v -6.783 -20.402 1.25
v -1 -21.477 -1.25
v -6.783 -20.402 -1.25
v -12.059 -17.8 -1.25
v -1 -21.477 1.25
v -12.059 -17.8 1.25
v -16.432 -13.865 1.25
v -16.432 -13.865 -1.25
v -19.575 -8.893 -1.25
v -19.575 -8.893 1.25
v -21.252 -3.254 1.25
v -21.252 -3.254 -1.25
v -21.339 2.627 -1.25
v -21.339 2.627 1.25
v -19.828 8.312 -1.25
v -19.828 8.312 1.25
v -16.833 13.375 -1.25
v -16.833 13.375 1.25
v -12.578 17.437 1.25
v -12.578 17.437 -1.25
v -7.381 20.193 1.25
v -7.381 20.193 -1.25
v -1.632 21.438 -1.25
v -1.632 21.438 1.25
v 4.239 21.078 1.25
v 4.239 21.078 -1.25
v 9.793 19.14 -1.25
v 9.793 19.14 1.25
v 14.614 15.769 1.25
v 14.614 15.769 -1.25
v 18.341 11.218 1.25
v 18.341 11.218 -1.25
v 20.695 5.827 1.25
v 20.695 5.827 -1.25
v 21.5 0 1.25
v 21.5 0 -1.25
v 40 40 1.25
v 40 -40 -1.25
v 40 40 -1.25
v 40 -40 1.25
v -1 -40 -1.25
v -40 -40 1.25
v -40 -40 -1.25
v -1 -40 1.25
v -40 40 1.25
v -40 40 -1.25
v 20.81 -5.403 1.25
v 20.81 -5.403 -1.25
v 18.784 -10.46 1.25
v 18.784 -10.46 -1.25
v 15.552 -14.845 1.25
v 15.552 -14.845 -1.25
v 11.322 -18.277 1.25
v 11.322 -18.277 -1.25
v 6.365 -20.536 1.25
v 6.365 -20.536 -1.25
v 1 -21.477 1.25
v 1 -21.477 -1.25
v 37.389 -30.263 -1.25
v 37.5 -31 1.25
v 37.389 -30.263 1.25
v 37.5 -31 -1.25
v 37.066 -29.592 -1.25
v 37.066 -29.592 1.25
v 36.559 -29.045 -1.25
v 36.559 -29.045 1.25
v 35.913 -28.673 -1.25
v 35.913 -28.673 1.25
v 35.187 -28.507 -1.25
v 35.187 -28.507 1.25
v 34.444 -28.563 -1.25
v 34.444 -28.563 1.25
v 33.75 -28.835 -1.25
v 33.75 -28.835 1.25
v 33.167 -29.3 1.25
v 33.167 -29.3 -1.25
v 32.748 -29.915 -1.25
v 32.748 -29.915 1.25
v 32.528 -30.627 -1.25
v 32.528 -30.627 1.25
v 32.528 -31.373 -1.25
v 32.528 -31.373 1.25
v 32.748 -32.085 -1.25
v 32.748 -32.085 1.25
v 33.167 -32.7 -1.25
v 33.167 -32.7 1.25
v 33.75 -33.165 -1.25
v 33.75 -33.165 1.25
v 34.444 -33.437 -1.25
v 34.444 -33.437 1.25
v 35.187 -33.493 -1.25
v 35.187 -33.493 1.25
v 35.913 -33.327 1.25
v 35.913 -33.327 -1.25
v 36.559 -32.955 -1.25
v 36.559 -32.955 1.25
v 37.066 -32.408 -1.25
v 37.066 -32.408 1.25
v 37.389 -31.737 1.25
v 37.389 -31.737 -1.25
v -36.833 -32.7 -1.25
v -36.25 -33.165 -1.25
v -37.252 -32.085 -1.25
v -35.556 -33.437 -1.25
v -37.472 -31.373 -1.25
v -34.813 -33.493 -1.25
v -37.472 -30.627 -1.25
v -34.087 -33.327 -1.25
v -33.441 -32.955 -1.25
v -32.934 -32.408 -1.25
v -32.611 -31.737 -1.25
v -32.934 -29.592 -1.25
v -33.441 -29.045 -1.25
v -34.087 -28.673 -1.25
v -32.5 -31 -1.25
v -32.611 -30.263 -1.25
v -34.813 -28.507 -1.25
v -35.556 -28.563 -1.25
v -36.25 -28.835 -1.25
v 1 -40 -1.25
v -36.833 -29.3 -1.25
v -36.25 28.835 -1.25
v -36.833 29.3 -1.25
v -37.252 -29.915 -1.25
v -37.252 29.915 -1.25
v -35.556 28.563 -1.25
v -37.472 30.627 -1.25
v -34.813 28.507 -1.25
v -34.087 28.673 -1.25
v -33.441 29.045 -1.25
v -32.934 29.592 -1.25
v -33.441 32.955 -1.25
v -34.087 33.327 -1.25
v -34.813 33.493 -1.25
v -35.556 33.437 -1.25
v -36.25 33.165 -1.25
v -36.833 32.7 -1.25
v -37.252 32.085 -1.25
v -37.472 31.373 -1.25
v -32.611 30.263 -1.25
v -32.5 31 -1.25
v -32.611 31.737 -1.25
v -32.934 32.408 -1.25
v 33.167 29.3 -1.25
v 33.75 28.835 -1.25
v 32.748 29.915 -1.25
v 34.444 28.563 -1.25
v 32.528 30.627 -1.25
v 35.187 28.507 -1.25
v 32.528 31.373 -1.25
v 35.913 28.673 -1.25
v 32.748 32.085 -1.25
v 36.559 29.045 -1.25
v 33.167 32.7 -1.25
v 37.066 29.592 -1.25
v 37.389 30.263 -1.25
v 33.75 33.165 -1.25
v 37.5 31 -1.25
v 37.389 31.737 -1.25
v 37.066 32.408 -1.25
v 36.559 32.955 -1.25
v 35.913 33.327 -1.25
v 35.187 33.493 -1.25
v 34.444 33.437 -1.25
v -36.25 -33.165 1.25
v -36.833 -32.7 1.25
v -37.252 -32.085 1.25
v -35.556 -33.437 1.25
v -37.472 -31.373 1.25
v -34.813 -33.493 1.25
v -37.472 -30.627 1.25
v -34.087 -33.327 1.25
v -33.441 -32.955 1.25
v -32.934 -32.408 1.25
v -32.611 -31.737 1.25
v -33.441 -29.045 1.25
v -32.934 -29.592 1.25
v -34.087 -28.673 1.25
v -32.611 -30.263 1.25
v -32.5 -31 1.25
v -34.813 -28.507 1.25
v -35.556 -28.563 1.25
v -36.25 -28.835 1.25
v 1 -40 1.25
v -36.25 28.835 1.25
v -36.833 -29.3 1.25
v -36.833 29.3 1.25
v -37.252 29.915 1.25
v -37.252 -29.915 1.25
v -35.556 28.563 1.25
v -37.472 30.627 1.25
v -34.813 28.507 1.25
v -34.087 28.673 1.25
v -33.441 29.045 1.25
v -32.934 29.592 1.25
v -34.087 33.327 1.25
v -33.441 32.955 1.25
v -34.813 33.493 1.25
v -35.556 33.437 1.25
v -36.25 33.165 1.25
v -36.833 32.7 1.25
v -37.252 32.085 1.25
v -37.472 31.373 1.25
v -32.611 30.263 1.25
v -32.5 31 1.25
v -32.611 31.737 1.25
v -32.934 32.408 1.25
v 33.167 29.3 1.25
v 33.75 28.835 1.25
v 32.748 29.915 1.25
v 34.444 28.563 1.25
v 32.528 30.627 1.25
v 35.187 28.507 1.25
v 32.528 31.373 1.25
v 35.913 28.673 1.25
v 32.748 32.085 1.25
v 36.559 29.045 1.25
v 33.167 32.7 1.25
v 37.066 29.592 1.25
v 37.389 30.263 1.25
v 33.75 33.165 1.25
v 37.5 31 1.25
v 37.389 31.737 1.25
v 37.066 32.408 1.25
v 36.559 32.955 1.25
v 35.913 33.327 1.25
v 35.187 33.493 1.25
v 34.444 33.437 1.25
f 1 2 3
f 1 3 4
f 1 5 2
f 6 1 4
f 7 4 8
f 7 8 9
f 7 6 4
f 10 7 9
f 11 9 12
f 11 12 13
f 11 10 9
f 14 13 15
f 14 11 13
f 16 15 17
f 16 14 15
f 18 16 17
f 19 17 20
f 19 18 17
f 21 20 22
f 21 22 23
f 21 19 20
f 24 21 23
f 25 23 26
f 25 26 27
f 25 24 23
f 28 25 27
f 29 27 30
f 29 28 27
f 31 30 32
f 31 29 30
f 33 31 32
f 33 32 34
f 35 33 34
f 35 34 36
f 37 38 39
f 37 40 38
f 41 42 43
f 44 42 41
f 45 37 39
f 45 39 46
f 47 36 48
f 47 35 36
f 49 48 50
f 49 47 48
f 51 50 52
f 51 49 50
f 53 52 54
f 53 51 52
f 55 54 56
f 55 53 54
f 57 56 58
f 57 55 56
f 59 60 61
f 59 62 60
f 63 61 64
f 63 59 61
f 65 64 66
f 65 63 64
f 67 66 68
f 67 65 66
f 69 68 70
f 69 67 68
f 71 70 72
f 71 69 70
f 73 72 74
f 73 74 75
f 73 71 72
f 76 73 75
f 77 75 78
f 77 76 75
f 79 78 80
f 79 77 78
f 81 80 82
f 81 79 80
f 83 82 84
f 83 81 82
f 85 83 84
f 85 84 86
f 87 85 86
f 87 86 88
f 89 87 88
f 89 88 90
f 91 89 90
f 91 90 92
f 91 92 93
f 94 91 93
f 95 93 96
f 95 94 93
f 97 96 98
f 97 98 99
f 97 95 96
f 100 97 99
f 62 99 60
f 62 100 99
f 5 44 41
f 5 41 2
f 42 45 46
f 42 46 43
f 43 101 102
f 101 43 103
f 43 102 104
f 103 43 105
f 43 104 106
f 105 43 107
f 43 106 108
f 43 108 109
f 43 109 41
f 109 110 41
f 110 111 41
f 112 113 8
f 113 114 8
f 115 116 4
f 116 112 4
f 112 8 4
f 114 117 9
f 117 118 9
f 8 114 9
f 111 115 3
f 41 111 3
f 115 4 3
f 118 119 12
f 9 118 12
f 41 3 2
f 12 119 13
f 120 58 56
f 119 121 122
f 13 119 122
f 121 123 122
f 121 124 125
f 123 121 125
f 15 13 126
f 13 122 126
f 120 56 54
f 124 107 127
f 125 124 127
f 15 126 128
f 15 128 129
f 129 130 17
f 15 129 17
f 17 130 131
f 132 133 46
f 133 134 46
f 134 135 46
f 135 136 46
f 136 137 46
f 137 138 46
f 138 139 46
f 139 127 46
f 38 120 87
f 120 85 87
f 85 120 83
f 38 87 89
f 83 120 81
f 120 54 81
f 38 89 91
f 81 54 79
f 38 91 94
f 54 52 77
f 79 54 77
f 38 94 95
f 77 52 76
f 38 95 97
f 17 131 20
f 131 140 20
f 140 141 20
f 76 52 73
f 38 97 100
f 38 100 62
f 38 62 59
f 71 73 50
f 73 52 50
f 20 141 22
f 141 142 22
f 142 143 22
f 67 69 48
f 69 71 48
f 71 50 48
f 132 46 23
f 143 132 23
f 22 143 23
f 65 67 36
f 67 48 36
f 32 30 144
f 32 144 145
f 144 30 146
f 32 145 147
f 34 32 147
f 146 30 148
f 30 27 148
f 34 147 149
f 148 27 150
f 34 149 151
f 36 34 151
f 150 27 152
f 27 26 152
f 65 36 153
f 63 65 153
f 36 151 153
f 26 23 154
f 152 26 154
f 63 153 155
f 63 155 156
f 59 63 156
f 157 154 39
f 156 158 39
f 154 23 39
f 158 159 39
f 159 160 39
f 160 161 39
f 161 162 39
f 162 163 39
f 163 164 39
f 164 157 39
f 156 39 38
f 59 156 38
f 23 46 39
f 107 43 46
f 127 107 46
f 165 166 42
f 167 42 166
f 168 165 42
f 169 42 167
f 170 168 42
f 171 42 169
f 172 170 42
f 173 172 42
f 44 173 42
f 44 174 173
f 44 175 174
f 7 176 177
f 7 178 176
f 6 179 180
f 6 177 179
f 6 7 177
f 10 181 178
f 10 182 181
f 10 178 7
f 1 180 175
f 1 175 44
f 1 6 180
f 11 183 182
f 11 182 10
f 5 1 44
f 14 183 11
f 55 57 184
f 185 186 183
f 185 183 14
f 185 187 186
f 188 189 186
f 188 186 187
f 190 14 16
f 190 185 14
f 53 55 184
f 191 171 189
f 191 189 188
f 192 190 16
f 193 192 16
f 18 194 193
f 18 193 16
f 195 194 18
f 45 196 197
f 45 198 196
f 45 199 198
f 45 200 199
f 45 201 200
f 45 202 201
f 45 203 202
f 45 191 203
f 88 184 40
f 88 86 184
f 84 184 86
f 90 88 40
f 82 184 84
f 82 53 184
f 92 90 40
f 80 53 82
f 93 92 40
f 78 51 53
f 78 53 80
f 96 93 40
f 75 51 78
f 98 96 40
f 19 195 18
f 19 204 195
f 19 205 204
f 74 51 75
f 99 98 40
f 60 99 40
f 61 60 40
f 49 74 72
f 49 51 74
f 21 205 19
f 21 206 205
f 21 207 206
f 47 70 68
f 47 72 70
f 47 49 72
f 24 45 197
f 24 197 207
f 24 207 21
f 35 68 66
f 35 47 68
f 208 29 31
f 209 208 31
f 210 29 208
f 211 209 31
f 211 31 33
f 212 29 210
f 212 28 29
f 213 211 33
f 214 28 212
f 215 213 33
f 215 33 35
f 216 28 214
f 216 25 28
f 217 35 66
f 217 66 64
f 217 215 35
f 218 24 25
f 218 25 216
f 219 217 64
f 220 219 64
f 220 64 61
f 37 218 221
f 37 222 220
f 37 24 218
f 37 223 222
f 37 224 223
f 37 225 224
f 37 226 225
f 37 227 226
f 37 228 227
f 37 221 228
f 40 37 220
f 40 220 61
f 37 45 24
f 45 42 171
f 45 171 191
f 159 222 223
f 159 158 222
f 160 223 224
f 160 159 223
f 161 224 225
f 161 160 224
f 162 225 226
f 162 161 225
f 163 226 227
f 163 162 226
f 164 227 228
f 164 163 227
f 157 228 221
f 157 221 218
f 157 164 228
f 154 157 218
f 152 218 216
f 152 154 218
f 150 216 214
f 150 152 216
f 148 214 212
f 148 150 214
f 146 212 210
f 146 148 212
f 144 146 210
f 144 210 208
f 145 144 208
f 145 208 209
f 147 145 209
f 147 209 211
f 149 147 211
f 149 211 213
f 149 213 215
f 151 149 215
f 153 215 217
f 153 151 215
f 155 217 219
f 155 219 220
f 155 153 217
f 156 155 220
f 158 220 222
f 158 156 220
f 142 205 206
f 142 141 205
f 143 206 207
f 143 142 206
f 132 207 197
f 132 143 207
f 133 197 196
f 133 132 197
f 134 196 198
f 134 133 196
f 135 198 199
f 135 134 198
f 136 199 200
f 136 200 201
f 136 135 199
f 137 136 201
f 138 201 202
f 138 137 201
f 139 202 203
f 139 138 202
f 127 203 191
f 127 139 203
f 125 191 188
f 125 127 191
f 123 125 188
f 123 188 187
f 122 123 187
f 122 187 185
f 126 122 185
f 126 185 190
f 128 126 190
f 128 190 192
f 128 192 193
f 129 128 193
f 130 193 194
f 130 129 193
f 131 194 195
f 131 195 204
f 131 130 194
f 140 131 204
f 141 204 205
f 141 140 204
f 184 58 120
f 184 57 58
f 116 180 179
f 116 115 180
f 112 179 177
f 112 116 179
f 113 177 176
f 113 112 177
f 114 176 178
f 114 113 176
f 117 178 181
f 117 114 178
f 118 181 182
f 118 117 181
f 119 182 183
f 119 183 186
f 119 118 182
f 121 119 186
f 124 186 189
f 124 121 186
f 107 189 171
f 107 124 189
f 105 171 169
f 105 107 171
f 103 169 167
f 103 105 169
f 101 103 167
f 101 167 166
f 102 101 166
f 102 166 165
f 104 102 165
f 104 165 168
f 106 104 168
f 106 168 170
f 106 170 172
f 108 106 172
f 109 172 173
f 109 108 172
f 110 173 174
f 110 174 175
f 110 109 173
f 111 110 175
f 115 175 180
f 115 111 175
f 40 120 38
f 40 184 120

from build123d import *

# Parameters (mm, degrees)
F0_R     = 2.5
F1_DEPTH = 1.25


with BuildPart() as f1:
    # F0 (on Top) → F1 (new body, symmetric)
    with BuildSketch(Plane.XY):
        with BuildLine():
            Line((40, -40), (40, 40))
            Line((40, 40), (-40, 40))
            Line((-40, 40), (-40, -40))
            Line((-40, -40), (-1, -40))
            Line((-1, -40), (-1, -21.5))
            Line((-1, -21.5), (-1, -21.476732))
            ThreePointArc((-1, -21.476732), (-14.845033, 15.552331), (21.5, 0))
            ThreePointArc((21.5, 0), (15.552331, -14.845033), (1, -21.476732))
            Line((1, -21.476732), (1, -21.5))
            Line((1, -21.5), (1, -40))
            Line((1, -40), (40, -40))
        make_face()
        with Locations((-35, -31)):
            Circle(F0_R, mode=Mode.SUBTRACT)
        with Locations((35, -31)):
            Circle(F0_R, mode=Mode.SUBTRACT)
        with Locations((-35, 31)):
            Circle(F0_R, mode=Mode.SUBTRACT)
        with Locations((35, 31)):
            Circle(F0_R, mode=Mode.SUBTRACT)
    extrude(amount=F1_DEPTH, both=True)


solid = f1.part
